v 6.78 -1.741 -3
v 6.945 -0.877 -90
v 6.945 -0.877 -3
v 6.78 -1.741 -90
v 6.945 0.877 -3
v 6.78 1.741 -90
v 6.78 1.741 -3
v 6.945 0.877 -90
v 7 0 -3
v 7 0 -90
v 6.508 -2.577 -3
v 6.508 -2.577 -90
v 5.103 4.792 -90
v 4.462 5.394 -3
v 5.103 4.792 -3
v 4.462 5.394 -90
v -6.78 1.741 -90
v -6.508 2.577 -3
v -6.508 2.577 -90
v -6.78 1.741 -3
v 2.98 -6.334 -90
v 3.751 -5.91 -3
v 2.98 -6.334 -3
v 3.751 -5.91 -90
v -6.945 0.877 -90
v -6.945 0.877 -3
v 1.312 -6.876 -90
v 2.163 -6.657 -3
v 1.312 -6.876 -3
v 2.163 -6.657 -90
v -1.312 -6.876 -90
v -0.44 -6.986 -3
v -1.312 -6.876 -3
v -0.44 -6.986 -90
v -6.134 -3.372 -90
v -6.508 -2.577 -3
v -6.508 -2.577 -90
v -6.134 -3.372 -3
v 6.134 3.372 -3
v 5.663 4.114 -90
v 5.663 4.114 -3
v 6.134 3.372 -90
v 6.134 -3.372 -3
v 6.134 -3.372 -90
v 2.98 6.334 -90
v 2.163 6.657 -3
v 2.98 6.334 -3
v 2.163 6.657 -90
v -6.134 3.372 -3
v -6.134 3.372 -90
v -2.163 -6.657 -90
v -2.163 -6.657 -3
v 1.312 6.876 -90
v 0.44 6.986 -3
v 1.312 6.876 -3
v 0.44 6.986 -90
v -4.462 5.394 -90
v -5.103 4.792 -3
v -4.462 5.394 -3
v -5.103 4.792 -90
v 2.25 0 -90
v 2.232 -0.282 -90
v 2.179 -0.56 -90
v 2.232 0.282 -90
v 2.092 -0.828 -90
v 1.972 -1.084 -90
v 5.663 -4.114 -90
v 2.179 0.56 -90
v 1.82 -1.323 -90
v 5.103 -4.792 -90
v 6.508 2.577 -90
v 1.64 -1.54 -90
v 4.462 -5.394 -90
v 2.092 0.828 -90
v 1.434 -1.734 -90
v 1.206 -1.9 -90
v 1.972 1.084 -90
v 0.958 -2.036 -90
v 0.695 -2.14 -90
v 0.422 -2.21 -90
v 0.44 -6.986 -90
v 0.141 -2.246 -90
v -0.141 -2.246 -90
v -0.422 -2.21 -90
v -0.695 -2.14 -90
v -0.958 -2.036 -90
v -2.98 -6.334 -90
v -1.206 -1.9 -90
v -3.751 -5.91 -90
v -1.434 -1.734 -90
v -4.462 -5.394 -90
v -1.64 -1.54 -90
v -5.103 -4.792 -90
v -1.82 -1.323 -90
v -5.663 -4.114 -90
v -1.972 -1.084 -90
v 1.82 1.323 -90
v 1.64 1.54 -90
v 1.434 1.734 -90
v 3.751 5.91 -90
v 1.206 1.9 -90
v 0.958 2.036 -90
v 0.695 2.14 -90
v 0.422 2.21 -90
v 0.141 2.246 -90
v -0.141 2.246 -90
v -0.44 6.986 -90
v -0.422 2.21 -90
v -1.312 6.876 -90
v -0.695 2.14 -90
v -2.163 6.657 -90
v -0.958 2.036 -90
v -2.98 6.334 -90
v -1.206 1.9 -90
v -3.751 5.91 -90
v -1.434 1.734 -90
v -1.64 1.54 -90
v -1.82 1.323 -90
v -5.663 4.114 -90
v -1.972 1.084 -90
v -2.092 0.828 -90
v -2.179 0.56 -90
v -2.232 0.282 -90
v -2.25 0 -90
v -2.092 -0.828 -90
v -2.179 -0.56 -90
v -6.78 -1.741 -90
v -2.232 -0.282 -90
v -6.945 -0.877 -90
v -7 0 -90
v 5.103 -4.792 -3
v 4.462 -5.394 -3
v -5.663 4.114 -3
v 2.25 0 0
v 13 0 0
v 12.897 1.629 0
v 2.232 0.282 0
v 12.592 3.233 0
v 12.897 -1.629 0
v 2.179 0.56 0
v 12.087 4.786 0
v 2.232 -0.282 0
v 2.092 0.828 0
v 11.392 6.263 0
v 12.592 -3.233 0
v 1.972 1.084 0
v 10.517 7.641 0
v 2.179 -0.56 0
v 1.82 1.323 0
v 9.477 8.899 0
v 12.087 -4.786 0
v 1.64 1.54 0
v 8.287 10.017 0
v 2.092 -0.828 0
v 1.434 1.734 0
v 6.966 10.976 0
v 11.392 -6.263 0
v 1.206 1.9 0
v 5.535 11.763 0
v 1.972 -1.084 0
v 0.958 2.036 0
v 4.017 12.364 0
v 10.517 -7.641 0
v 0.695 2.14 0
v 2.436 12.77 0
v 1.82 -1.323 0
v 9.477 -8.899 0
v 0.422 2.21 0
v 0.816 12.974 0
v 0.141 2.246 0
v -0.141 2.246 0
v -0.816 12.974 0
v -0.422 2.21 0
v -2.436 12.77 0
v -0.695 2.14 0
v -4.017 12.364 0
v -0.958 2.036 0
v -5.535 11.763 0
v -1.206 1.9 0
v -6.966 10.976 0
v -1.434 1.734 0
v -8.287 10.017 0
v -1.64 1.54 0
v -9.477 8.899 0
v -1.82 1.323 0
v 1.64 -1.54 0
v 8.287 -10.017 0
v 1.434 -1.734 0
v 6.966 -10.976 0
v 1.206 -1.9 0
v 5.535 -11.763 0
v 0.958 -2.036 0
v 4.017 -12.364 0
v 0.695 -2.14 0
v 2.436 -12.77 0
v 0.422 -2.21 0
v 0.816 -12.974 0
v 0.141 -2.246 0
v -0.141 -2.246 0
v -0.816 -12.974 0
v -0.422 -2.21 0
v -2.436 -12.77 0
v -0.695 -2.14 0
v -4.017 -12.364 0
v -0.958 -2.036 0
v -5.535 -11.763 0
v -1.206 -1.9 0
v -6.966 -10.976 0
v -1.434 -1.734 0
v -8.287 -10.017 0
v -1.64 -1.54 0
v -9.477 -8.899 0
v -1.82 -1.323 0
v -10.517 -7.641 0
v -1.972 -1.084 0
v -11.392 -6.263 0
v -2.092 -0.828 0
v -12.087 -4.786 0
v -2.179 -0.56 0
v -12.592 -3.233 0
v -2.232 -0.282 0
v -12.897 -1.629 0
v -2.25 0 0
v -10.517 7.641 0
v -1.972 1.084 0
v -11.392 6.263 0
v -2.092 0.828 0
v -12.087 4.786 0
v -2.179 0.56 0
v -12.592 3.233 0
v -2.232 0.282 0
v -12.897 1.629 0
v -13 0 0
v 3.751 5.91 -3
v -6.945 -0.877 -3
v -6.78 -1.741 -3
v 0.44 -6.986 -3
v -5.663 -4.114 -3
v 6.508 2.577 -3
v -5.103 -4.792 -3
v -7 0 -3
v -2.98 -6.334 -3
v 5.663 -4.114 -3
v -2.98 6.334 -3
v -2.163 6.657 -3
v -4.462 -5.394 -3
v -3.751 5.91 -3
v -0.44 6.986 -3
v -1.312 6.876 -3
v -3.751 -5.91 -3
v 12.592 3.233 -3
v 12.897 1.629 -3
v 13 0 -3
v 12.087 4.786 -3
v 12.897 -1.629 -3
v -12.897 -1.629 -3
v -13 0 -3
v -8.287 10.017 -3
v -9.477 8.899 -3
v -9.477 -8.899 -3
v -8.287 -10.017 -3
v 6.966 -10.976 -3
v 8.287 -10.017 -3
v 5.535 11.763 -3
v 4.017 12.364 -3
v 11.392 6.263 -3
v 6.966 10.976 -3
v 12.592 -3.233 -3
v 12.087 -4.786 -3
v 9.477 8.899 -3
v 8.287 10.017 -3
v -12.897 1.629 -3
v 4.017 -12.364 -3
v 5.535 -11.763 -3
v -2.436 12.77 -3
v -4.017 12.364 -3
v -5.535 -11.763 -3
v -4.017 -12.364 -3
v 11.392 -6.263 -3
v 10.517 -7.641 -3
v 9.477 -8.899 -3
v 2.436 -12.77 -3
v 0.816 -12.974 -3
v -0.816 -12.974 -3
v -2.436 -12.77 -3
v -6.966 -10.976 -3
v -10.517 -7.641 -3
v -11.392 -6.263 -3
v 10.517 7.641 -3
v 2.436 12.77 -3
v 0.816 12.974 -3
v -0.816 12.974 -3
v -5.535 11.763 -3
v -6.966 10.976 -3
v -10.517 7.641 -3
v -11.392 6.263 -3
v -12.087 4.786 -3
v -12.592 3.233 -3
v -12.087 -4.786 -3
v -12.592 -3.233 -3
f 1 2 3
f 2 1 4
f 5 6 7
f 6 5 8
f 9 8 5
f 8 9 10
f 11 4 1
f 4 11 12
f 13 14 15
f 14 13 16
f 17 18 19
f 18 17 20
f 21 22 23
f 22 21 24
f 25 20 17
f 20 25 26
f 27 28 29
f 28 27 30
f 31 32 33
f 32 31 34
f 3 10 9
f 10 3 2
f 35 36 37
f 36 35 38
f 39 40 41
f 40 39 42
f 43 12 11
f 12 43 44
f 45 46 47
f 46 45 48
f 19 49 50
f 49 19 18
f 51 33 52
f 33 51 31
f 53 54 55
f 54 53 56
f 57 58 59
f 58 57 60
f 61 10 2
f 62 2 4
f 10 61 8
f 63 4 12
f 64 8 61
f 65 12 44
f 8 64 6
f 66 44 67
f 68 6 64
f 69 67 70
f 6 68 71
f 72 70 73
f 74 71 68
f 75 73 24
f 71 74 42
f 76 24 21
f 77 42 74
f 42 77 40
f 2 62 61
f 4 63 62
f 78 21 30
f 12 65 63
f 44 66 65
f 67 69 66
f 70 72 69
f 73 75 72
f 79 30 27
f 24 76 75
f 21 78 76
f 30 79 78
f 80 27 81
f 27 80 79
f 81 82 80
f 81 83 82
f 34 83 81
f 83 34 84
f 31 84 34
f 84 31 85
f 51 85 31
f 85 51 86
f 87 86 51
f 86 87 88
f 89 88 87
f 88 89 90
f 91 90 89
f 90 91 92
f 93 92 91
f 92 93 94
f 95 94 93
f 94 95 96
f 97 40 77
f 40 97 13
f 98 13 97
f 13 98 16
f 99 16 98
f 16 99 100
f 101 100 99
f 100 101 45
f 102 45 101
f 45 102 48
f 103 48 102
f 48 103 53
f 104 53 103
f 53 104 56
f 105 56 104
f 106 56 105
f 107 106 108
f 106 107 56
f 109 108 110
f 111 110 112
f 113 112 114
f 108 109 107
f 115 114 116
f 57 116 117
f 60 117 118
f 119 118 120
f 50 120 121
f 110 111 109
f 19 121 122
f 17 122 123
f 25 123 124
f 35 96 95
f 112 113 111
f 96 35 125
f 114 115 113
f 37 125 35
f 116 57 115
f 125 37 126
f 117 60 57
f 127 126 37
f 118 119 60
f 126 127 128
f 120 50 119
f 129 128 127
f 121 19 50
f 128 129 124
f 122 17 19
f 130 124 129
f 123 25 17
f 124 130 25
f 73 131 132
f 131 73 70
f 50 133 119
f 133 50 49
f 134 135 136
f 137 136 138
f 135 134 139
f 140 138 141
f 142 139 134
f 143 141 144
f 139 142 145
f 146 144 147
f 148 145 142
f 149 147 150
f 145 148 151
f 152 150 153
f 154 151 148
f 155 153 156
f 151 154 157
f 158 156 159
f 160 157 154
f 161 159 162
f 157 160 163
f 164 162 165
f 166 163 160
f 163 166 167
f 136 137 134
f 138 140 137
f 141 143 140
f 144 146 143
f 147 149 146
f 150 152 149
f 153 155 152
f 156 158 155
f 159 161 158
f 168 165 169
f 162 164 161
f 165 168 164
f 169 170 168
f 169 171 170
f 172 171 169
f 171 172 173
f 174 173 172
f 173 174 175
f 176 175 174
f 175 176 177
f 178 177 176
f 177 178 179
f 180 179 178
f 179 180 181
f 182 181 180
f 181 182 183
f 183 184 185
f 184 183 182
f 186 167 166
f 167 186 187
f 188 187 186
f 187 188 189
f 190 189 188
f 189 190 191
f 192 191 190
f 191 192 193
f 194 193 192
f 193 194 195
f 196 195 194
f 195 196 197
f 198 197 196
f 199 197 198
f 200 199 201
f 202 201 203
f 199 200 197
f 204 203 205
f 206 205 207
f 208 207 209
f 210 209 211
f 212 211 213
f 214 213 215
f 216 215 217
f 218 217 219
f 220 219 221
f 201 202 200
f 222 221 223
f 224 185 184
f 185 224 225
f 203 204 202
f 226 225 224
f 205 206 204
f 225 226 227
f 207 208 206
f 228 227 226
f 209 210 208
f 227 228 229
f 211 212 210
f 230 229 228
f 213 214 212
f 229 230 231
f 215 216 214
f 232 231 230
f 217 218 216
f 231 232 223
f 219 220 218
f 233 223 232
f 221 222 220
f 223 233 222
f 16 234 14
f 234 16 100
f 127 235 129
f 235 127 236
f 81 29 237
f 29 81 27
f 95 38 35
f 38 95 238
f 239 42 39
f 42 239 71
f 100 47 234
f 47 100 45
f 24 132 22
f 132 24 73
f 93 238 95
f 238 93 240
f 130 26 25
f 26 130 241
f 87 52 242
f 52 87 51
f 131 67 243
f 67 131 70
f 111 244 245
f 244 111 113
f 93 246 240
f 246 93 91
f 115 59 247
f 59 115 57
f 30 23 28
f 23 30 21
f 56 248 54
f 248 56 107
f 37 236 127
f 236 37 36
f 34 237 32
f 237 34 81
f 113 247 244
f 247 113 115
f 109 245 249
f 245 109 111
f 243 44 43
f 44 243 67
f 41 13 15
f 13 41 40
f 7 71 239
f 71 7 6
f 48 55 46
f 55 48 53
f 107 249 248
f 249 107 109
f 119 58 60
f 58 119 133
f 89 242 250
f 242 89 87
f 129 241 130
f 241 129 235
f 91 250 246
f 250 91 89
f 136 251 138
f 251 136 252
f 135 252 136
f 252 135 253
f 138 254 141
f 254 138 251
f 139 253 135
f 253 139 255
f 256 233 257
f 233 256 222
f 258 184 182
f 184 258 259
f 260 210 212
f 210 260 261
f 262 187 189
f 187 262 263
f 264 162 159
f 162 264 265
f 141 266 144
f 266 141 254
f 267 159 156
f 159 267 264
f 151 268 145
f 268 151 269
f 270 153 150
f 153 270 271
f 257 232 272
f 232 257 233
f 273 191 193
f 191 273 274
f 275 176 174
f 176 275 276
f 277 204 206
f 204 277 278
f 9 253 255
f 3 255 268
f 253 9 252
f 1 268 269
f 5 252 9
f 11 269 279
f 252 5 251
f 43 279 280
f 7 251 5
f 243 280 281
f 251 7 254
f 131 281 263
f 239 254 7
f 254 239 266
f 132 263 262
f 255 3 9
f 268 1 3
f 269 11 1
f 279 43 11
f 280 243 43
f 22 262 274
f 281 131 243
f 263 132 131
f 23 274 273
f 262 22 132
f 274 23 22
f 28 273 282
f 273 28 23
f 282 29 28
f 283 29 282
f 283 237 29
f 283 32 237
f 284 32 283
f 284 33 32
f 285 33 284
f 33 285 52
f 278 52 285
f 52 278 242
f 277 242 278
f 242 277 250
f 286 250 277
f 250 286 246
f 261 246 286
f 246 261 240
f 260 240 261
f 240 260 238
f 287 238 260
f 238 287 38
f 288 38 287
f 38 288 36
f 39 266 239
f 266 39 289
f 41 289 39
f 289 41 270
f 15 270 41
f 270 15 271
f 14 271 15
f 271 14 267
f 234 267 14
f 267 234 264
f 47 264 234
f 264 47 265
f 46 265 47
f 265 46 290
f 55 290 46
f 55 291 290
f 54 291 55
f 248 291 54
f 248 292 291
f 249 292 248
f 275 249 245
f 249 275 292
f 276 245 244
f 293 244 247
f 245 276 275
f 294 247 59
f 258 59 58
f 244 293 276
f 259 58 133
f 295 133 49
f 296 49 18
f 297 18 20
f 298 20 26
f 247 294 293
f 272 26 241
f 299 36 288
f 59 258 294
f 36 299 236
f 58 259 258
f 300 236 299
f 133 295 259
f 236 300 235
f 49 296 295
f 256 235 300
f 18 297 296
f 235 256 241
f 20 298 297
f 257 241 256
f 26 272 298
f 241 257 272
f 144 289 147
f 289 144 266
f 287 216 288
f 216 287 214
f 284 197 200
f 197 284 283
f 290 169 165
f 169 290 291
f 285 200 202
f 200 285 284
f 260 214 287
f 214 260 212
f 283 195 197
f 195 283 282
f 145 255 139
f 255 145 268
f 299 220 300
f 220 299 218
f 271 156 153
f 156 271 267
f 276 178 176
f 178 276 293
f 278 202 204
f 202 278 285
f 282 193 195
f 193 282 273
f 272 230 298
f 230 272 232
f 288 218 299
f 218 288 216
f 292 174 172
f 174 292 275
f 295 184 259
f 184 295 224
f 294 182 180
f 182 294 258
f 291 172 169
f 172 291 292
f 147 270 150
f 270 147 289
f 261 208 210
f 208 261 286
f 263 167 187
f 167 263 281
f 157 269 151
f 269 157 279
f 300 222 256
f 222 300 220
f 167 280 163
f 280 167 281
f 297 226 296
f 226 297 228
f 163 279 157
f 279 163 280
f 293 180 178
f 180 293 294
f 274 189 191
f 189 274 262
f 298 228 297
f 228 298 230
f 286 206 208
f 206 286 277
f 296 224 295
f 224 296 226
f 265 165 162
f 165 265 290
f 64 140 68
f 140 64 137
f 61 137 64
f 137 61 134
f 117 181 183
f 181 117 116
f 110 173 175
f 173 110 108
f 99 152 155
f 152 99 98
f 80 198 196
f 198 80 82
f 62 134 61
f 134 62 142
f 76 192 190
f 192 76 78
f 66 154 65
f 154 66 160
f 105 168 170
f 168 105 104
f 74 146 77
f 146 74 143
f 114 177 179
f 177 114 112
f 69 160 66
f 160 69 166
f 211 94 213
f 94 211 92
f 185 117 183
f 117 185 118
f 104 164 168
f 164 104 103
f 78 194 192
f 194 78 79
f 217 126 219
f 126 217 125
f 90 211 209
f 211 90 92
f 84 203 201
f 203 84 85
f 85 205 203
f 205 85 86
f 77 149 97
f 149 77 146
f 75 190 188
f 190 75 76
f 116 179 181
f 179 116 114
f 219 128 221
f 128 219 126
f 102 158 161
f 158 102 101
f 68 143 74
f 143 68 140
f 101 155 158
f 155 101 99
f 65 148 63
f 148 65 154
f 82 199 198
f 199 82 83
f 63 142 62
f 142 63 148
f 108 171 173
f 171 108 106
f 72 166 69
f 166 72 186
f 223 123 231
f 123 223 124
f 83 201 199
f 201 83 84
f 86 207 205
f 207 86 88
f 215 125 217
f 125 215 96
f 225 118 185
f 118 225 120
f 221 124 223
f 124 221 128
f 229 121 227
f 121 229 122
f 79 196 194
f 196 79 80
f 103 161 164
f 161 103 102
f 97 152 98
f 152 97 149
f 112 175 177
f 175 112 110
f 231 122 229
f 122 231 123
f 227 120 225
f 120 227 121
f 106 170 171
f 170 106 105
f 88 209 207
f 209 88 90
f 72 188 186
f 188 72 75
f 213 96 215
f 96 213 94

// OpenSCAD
$fn = 50;


difference() {
	union() {
		translate(v = [0, 0, -90.0000000000]) {
			cylinder(h = 90, r = 7.0000000000);
		}
		translate(v = [0, 0, -3.0000000000]) {
			cylinder(h = 3, r = 13.0000000000);
		}
	}
	union() {
		#translate(v = [0, 0, -90]) {
			cylinder(h = 90, r = 2.2500000000);
		}
	}
}
